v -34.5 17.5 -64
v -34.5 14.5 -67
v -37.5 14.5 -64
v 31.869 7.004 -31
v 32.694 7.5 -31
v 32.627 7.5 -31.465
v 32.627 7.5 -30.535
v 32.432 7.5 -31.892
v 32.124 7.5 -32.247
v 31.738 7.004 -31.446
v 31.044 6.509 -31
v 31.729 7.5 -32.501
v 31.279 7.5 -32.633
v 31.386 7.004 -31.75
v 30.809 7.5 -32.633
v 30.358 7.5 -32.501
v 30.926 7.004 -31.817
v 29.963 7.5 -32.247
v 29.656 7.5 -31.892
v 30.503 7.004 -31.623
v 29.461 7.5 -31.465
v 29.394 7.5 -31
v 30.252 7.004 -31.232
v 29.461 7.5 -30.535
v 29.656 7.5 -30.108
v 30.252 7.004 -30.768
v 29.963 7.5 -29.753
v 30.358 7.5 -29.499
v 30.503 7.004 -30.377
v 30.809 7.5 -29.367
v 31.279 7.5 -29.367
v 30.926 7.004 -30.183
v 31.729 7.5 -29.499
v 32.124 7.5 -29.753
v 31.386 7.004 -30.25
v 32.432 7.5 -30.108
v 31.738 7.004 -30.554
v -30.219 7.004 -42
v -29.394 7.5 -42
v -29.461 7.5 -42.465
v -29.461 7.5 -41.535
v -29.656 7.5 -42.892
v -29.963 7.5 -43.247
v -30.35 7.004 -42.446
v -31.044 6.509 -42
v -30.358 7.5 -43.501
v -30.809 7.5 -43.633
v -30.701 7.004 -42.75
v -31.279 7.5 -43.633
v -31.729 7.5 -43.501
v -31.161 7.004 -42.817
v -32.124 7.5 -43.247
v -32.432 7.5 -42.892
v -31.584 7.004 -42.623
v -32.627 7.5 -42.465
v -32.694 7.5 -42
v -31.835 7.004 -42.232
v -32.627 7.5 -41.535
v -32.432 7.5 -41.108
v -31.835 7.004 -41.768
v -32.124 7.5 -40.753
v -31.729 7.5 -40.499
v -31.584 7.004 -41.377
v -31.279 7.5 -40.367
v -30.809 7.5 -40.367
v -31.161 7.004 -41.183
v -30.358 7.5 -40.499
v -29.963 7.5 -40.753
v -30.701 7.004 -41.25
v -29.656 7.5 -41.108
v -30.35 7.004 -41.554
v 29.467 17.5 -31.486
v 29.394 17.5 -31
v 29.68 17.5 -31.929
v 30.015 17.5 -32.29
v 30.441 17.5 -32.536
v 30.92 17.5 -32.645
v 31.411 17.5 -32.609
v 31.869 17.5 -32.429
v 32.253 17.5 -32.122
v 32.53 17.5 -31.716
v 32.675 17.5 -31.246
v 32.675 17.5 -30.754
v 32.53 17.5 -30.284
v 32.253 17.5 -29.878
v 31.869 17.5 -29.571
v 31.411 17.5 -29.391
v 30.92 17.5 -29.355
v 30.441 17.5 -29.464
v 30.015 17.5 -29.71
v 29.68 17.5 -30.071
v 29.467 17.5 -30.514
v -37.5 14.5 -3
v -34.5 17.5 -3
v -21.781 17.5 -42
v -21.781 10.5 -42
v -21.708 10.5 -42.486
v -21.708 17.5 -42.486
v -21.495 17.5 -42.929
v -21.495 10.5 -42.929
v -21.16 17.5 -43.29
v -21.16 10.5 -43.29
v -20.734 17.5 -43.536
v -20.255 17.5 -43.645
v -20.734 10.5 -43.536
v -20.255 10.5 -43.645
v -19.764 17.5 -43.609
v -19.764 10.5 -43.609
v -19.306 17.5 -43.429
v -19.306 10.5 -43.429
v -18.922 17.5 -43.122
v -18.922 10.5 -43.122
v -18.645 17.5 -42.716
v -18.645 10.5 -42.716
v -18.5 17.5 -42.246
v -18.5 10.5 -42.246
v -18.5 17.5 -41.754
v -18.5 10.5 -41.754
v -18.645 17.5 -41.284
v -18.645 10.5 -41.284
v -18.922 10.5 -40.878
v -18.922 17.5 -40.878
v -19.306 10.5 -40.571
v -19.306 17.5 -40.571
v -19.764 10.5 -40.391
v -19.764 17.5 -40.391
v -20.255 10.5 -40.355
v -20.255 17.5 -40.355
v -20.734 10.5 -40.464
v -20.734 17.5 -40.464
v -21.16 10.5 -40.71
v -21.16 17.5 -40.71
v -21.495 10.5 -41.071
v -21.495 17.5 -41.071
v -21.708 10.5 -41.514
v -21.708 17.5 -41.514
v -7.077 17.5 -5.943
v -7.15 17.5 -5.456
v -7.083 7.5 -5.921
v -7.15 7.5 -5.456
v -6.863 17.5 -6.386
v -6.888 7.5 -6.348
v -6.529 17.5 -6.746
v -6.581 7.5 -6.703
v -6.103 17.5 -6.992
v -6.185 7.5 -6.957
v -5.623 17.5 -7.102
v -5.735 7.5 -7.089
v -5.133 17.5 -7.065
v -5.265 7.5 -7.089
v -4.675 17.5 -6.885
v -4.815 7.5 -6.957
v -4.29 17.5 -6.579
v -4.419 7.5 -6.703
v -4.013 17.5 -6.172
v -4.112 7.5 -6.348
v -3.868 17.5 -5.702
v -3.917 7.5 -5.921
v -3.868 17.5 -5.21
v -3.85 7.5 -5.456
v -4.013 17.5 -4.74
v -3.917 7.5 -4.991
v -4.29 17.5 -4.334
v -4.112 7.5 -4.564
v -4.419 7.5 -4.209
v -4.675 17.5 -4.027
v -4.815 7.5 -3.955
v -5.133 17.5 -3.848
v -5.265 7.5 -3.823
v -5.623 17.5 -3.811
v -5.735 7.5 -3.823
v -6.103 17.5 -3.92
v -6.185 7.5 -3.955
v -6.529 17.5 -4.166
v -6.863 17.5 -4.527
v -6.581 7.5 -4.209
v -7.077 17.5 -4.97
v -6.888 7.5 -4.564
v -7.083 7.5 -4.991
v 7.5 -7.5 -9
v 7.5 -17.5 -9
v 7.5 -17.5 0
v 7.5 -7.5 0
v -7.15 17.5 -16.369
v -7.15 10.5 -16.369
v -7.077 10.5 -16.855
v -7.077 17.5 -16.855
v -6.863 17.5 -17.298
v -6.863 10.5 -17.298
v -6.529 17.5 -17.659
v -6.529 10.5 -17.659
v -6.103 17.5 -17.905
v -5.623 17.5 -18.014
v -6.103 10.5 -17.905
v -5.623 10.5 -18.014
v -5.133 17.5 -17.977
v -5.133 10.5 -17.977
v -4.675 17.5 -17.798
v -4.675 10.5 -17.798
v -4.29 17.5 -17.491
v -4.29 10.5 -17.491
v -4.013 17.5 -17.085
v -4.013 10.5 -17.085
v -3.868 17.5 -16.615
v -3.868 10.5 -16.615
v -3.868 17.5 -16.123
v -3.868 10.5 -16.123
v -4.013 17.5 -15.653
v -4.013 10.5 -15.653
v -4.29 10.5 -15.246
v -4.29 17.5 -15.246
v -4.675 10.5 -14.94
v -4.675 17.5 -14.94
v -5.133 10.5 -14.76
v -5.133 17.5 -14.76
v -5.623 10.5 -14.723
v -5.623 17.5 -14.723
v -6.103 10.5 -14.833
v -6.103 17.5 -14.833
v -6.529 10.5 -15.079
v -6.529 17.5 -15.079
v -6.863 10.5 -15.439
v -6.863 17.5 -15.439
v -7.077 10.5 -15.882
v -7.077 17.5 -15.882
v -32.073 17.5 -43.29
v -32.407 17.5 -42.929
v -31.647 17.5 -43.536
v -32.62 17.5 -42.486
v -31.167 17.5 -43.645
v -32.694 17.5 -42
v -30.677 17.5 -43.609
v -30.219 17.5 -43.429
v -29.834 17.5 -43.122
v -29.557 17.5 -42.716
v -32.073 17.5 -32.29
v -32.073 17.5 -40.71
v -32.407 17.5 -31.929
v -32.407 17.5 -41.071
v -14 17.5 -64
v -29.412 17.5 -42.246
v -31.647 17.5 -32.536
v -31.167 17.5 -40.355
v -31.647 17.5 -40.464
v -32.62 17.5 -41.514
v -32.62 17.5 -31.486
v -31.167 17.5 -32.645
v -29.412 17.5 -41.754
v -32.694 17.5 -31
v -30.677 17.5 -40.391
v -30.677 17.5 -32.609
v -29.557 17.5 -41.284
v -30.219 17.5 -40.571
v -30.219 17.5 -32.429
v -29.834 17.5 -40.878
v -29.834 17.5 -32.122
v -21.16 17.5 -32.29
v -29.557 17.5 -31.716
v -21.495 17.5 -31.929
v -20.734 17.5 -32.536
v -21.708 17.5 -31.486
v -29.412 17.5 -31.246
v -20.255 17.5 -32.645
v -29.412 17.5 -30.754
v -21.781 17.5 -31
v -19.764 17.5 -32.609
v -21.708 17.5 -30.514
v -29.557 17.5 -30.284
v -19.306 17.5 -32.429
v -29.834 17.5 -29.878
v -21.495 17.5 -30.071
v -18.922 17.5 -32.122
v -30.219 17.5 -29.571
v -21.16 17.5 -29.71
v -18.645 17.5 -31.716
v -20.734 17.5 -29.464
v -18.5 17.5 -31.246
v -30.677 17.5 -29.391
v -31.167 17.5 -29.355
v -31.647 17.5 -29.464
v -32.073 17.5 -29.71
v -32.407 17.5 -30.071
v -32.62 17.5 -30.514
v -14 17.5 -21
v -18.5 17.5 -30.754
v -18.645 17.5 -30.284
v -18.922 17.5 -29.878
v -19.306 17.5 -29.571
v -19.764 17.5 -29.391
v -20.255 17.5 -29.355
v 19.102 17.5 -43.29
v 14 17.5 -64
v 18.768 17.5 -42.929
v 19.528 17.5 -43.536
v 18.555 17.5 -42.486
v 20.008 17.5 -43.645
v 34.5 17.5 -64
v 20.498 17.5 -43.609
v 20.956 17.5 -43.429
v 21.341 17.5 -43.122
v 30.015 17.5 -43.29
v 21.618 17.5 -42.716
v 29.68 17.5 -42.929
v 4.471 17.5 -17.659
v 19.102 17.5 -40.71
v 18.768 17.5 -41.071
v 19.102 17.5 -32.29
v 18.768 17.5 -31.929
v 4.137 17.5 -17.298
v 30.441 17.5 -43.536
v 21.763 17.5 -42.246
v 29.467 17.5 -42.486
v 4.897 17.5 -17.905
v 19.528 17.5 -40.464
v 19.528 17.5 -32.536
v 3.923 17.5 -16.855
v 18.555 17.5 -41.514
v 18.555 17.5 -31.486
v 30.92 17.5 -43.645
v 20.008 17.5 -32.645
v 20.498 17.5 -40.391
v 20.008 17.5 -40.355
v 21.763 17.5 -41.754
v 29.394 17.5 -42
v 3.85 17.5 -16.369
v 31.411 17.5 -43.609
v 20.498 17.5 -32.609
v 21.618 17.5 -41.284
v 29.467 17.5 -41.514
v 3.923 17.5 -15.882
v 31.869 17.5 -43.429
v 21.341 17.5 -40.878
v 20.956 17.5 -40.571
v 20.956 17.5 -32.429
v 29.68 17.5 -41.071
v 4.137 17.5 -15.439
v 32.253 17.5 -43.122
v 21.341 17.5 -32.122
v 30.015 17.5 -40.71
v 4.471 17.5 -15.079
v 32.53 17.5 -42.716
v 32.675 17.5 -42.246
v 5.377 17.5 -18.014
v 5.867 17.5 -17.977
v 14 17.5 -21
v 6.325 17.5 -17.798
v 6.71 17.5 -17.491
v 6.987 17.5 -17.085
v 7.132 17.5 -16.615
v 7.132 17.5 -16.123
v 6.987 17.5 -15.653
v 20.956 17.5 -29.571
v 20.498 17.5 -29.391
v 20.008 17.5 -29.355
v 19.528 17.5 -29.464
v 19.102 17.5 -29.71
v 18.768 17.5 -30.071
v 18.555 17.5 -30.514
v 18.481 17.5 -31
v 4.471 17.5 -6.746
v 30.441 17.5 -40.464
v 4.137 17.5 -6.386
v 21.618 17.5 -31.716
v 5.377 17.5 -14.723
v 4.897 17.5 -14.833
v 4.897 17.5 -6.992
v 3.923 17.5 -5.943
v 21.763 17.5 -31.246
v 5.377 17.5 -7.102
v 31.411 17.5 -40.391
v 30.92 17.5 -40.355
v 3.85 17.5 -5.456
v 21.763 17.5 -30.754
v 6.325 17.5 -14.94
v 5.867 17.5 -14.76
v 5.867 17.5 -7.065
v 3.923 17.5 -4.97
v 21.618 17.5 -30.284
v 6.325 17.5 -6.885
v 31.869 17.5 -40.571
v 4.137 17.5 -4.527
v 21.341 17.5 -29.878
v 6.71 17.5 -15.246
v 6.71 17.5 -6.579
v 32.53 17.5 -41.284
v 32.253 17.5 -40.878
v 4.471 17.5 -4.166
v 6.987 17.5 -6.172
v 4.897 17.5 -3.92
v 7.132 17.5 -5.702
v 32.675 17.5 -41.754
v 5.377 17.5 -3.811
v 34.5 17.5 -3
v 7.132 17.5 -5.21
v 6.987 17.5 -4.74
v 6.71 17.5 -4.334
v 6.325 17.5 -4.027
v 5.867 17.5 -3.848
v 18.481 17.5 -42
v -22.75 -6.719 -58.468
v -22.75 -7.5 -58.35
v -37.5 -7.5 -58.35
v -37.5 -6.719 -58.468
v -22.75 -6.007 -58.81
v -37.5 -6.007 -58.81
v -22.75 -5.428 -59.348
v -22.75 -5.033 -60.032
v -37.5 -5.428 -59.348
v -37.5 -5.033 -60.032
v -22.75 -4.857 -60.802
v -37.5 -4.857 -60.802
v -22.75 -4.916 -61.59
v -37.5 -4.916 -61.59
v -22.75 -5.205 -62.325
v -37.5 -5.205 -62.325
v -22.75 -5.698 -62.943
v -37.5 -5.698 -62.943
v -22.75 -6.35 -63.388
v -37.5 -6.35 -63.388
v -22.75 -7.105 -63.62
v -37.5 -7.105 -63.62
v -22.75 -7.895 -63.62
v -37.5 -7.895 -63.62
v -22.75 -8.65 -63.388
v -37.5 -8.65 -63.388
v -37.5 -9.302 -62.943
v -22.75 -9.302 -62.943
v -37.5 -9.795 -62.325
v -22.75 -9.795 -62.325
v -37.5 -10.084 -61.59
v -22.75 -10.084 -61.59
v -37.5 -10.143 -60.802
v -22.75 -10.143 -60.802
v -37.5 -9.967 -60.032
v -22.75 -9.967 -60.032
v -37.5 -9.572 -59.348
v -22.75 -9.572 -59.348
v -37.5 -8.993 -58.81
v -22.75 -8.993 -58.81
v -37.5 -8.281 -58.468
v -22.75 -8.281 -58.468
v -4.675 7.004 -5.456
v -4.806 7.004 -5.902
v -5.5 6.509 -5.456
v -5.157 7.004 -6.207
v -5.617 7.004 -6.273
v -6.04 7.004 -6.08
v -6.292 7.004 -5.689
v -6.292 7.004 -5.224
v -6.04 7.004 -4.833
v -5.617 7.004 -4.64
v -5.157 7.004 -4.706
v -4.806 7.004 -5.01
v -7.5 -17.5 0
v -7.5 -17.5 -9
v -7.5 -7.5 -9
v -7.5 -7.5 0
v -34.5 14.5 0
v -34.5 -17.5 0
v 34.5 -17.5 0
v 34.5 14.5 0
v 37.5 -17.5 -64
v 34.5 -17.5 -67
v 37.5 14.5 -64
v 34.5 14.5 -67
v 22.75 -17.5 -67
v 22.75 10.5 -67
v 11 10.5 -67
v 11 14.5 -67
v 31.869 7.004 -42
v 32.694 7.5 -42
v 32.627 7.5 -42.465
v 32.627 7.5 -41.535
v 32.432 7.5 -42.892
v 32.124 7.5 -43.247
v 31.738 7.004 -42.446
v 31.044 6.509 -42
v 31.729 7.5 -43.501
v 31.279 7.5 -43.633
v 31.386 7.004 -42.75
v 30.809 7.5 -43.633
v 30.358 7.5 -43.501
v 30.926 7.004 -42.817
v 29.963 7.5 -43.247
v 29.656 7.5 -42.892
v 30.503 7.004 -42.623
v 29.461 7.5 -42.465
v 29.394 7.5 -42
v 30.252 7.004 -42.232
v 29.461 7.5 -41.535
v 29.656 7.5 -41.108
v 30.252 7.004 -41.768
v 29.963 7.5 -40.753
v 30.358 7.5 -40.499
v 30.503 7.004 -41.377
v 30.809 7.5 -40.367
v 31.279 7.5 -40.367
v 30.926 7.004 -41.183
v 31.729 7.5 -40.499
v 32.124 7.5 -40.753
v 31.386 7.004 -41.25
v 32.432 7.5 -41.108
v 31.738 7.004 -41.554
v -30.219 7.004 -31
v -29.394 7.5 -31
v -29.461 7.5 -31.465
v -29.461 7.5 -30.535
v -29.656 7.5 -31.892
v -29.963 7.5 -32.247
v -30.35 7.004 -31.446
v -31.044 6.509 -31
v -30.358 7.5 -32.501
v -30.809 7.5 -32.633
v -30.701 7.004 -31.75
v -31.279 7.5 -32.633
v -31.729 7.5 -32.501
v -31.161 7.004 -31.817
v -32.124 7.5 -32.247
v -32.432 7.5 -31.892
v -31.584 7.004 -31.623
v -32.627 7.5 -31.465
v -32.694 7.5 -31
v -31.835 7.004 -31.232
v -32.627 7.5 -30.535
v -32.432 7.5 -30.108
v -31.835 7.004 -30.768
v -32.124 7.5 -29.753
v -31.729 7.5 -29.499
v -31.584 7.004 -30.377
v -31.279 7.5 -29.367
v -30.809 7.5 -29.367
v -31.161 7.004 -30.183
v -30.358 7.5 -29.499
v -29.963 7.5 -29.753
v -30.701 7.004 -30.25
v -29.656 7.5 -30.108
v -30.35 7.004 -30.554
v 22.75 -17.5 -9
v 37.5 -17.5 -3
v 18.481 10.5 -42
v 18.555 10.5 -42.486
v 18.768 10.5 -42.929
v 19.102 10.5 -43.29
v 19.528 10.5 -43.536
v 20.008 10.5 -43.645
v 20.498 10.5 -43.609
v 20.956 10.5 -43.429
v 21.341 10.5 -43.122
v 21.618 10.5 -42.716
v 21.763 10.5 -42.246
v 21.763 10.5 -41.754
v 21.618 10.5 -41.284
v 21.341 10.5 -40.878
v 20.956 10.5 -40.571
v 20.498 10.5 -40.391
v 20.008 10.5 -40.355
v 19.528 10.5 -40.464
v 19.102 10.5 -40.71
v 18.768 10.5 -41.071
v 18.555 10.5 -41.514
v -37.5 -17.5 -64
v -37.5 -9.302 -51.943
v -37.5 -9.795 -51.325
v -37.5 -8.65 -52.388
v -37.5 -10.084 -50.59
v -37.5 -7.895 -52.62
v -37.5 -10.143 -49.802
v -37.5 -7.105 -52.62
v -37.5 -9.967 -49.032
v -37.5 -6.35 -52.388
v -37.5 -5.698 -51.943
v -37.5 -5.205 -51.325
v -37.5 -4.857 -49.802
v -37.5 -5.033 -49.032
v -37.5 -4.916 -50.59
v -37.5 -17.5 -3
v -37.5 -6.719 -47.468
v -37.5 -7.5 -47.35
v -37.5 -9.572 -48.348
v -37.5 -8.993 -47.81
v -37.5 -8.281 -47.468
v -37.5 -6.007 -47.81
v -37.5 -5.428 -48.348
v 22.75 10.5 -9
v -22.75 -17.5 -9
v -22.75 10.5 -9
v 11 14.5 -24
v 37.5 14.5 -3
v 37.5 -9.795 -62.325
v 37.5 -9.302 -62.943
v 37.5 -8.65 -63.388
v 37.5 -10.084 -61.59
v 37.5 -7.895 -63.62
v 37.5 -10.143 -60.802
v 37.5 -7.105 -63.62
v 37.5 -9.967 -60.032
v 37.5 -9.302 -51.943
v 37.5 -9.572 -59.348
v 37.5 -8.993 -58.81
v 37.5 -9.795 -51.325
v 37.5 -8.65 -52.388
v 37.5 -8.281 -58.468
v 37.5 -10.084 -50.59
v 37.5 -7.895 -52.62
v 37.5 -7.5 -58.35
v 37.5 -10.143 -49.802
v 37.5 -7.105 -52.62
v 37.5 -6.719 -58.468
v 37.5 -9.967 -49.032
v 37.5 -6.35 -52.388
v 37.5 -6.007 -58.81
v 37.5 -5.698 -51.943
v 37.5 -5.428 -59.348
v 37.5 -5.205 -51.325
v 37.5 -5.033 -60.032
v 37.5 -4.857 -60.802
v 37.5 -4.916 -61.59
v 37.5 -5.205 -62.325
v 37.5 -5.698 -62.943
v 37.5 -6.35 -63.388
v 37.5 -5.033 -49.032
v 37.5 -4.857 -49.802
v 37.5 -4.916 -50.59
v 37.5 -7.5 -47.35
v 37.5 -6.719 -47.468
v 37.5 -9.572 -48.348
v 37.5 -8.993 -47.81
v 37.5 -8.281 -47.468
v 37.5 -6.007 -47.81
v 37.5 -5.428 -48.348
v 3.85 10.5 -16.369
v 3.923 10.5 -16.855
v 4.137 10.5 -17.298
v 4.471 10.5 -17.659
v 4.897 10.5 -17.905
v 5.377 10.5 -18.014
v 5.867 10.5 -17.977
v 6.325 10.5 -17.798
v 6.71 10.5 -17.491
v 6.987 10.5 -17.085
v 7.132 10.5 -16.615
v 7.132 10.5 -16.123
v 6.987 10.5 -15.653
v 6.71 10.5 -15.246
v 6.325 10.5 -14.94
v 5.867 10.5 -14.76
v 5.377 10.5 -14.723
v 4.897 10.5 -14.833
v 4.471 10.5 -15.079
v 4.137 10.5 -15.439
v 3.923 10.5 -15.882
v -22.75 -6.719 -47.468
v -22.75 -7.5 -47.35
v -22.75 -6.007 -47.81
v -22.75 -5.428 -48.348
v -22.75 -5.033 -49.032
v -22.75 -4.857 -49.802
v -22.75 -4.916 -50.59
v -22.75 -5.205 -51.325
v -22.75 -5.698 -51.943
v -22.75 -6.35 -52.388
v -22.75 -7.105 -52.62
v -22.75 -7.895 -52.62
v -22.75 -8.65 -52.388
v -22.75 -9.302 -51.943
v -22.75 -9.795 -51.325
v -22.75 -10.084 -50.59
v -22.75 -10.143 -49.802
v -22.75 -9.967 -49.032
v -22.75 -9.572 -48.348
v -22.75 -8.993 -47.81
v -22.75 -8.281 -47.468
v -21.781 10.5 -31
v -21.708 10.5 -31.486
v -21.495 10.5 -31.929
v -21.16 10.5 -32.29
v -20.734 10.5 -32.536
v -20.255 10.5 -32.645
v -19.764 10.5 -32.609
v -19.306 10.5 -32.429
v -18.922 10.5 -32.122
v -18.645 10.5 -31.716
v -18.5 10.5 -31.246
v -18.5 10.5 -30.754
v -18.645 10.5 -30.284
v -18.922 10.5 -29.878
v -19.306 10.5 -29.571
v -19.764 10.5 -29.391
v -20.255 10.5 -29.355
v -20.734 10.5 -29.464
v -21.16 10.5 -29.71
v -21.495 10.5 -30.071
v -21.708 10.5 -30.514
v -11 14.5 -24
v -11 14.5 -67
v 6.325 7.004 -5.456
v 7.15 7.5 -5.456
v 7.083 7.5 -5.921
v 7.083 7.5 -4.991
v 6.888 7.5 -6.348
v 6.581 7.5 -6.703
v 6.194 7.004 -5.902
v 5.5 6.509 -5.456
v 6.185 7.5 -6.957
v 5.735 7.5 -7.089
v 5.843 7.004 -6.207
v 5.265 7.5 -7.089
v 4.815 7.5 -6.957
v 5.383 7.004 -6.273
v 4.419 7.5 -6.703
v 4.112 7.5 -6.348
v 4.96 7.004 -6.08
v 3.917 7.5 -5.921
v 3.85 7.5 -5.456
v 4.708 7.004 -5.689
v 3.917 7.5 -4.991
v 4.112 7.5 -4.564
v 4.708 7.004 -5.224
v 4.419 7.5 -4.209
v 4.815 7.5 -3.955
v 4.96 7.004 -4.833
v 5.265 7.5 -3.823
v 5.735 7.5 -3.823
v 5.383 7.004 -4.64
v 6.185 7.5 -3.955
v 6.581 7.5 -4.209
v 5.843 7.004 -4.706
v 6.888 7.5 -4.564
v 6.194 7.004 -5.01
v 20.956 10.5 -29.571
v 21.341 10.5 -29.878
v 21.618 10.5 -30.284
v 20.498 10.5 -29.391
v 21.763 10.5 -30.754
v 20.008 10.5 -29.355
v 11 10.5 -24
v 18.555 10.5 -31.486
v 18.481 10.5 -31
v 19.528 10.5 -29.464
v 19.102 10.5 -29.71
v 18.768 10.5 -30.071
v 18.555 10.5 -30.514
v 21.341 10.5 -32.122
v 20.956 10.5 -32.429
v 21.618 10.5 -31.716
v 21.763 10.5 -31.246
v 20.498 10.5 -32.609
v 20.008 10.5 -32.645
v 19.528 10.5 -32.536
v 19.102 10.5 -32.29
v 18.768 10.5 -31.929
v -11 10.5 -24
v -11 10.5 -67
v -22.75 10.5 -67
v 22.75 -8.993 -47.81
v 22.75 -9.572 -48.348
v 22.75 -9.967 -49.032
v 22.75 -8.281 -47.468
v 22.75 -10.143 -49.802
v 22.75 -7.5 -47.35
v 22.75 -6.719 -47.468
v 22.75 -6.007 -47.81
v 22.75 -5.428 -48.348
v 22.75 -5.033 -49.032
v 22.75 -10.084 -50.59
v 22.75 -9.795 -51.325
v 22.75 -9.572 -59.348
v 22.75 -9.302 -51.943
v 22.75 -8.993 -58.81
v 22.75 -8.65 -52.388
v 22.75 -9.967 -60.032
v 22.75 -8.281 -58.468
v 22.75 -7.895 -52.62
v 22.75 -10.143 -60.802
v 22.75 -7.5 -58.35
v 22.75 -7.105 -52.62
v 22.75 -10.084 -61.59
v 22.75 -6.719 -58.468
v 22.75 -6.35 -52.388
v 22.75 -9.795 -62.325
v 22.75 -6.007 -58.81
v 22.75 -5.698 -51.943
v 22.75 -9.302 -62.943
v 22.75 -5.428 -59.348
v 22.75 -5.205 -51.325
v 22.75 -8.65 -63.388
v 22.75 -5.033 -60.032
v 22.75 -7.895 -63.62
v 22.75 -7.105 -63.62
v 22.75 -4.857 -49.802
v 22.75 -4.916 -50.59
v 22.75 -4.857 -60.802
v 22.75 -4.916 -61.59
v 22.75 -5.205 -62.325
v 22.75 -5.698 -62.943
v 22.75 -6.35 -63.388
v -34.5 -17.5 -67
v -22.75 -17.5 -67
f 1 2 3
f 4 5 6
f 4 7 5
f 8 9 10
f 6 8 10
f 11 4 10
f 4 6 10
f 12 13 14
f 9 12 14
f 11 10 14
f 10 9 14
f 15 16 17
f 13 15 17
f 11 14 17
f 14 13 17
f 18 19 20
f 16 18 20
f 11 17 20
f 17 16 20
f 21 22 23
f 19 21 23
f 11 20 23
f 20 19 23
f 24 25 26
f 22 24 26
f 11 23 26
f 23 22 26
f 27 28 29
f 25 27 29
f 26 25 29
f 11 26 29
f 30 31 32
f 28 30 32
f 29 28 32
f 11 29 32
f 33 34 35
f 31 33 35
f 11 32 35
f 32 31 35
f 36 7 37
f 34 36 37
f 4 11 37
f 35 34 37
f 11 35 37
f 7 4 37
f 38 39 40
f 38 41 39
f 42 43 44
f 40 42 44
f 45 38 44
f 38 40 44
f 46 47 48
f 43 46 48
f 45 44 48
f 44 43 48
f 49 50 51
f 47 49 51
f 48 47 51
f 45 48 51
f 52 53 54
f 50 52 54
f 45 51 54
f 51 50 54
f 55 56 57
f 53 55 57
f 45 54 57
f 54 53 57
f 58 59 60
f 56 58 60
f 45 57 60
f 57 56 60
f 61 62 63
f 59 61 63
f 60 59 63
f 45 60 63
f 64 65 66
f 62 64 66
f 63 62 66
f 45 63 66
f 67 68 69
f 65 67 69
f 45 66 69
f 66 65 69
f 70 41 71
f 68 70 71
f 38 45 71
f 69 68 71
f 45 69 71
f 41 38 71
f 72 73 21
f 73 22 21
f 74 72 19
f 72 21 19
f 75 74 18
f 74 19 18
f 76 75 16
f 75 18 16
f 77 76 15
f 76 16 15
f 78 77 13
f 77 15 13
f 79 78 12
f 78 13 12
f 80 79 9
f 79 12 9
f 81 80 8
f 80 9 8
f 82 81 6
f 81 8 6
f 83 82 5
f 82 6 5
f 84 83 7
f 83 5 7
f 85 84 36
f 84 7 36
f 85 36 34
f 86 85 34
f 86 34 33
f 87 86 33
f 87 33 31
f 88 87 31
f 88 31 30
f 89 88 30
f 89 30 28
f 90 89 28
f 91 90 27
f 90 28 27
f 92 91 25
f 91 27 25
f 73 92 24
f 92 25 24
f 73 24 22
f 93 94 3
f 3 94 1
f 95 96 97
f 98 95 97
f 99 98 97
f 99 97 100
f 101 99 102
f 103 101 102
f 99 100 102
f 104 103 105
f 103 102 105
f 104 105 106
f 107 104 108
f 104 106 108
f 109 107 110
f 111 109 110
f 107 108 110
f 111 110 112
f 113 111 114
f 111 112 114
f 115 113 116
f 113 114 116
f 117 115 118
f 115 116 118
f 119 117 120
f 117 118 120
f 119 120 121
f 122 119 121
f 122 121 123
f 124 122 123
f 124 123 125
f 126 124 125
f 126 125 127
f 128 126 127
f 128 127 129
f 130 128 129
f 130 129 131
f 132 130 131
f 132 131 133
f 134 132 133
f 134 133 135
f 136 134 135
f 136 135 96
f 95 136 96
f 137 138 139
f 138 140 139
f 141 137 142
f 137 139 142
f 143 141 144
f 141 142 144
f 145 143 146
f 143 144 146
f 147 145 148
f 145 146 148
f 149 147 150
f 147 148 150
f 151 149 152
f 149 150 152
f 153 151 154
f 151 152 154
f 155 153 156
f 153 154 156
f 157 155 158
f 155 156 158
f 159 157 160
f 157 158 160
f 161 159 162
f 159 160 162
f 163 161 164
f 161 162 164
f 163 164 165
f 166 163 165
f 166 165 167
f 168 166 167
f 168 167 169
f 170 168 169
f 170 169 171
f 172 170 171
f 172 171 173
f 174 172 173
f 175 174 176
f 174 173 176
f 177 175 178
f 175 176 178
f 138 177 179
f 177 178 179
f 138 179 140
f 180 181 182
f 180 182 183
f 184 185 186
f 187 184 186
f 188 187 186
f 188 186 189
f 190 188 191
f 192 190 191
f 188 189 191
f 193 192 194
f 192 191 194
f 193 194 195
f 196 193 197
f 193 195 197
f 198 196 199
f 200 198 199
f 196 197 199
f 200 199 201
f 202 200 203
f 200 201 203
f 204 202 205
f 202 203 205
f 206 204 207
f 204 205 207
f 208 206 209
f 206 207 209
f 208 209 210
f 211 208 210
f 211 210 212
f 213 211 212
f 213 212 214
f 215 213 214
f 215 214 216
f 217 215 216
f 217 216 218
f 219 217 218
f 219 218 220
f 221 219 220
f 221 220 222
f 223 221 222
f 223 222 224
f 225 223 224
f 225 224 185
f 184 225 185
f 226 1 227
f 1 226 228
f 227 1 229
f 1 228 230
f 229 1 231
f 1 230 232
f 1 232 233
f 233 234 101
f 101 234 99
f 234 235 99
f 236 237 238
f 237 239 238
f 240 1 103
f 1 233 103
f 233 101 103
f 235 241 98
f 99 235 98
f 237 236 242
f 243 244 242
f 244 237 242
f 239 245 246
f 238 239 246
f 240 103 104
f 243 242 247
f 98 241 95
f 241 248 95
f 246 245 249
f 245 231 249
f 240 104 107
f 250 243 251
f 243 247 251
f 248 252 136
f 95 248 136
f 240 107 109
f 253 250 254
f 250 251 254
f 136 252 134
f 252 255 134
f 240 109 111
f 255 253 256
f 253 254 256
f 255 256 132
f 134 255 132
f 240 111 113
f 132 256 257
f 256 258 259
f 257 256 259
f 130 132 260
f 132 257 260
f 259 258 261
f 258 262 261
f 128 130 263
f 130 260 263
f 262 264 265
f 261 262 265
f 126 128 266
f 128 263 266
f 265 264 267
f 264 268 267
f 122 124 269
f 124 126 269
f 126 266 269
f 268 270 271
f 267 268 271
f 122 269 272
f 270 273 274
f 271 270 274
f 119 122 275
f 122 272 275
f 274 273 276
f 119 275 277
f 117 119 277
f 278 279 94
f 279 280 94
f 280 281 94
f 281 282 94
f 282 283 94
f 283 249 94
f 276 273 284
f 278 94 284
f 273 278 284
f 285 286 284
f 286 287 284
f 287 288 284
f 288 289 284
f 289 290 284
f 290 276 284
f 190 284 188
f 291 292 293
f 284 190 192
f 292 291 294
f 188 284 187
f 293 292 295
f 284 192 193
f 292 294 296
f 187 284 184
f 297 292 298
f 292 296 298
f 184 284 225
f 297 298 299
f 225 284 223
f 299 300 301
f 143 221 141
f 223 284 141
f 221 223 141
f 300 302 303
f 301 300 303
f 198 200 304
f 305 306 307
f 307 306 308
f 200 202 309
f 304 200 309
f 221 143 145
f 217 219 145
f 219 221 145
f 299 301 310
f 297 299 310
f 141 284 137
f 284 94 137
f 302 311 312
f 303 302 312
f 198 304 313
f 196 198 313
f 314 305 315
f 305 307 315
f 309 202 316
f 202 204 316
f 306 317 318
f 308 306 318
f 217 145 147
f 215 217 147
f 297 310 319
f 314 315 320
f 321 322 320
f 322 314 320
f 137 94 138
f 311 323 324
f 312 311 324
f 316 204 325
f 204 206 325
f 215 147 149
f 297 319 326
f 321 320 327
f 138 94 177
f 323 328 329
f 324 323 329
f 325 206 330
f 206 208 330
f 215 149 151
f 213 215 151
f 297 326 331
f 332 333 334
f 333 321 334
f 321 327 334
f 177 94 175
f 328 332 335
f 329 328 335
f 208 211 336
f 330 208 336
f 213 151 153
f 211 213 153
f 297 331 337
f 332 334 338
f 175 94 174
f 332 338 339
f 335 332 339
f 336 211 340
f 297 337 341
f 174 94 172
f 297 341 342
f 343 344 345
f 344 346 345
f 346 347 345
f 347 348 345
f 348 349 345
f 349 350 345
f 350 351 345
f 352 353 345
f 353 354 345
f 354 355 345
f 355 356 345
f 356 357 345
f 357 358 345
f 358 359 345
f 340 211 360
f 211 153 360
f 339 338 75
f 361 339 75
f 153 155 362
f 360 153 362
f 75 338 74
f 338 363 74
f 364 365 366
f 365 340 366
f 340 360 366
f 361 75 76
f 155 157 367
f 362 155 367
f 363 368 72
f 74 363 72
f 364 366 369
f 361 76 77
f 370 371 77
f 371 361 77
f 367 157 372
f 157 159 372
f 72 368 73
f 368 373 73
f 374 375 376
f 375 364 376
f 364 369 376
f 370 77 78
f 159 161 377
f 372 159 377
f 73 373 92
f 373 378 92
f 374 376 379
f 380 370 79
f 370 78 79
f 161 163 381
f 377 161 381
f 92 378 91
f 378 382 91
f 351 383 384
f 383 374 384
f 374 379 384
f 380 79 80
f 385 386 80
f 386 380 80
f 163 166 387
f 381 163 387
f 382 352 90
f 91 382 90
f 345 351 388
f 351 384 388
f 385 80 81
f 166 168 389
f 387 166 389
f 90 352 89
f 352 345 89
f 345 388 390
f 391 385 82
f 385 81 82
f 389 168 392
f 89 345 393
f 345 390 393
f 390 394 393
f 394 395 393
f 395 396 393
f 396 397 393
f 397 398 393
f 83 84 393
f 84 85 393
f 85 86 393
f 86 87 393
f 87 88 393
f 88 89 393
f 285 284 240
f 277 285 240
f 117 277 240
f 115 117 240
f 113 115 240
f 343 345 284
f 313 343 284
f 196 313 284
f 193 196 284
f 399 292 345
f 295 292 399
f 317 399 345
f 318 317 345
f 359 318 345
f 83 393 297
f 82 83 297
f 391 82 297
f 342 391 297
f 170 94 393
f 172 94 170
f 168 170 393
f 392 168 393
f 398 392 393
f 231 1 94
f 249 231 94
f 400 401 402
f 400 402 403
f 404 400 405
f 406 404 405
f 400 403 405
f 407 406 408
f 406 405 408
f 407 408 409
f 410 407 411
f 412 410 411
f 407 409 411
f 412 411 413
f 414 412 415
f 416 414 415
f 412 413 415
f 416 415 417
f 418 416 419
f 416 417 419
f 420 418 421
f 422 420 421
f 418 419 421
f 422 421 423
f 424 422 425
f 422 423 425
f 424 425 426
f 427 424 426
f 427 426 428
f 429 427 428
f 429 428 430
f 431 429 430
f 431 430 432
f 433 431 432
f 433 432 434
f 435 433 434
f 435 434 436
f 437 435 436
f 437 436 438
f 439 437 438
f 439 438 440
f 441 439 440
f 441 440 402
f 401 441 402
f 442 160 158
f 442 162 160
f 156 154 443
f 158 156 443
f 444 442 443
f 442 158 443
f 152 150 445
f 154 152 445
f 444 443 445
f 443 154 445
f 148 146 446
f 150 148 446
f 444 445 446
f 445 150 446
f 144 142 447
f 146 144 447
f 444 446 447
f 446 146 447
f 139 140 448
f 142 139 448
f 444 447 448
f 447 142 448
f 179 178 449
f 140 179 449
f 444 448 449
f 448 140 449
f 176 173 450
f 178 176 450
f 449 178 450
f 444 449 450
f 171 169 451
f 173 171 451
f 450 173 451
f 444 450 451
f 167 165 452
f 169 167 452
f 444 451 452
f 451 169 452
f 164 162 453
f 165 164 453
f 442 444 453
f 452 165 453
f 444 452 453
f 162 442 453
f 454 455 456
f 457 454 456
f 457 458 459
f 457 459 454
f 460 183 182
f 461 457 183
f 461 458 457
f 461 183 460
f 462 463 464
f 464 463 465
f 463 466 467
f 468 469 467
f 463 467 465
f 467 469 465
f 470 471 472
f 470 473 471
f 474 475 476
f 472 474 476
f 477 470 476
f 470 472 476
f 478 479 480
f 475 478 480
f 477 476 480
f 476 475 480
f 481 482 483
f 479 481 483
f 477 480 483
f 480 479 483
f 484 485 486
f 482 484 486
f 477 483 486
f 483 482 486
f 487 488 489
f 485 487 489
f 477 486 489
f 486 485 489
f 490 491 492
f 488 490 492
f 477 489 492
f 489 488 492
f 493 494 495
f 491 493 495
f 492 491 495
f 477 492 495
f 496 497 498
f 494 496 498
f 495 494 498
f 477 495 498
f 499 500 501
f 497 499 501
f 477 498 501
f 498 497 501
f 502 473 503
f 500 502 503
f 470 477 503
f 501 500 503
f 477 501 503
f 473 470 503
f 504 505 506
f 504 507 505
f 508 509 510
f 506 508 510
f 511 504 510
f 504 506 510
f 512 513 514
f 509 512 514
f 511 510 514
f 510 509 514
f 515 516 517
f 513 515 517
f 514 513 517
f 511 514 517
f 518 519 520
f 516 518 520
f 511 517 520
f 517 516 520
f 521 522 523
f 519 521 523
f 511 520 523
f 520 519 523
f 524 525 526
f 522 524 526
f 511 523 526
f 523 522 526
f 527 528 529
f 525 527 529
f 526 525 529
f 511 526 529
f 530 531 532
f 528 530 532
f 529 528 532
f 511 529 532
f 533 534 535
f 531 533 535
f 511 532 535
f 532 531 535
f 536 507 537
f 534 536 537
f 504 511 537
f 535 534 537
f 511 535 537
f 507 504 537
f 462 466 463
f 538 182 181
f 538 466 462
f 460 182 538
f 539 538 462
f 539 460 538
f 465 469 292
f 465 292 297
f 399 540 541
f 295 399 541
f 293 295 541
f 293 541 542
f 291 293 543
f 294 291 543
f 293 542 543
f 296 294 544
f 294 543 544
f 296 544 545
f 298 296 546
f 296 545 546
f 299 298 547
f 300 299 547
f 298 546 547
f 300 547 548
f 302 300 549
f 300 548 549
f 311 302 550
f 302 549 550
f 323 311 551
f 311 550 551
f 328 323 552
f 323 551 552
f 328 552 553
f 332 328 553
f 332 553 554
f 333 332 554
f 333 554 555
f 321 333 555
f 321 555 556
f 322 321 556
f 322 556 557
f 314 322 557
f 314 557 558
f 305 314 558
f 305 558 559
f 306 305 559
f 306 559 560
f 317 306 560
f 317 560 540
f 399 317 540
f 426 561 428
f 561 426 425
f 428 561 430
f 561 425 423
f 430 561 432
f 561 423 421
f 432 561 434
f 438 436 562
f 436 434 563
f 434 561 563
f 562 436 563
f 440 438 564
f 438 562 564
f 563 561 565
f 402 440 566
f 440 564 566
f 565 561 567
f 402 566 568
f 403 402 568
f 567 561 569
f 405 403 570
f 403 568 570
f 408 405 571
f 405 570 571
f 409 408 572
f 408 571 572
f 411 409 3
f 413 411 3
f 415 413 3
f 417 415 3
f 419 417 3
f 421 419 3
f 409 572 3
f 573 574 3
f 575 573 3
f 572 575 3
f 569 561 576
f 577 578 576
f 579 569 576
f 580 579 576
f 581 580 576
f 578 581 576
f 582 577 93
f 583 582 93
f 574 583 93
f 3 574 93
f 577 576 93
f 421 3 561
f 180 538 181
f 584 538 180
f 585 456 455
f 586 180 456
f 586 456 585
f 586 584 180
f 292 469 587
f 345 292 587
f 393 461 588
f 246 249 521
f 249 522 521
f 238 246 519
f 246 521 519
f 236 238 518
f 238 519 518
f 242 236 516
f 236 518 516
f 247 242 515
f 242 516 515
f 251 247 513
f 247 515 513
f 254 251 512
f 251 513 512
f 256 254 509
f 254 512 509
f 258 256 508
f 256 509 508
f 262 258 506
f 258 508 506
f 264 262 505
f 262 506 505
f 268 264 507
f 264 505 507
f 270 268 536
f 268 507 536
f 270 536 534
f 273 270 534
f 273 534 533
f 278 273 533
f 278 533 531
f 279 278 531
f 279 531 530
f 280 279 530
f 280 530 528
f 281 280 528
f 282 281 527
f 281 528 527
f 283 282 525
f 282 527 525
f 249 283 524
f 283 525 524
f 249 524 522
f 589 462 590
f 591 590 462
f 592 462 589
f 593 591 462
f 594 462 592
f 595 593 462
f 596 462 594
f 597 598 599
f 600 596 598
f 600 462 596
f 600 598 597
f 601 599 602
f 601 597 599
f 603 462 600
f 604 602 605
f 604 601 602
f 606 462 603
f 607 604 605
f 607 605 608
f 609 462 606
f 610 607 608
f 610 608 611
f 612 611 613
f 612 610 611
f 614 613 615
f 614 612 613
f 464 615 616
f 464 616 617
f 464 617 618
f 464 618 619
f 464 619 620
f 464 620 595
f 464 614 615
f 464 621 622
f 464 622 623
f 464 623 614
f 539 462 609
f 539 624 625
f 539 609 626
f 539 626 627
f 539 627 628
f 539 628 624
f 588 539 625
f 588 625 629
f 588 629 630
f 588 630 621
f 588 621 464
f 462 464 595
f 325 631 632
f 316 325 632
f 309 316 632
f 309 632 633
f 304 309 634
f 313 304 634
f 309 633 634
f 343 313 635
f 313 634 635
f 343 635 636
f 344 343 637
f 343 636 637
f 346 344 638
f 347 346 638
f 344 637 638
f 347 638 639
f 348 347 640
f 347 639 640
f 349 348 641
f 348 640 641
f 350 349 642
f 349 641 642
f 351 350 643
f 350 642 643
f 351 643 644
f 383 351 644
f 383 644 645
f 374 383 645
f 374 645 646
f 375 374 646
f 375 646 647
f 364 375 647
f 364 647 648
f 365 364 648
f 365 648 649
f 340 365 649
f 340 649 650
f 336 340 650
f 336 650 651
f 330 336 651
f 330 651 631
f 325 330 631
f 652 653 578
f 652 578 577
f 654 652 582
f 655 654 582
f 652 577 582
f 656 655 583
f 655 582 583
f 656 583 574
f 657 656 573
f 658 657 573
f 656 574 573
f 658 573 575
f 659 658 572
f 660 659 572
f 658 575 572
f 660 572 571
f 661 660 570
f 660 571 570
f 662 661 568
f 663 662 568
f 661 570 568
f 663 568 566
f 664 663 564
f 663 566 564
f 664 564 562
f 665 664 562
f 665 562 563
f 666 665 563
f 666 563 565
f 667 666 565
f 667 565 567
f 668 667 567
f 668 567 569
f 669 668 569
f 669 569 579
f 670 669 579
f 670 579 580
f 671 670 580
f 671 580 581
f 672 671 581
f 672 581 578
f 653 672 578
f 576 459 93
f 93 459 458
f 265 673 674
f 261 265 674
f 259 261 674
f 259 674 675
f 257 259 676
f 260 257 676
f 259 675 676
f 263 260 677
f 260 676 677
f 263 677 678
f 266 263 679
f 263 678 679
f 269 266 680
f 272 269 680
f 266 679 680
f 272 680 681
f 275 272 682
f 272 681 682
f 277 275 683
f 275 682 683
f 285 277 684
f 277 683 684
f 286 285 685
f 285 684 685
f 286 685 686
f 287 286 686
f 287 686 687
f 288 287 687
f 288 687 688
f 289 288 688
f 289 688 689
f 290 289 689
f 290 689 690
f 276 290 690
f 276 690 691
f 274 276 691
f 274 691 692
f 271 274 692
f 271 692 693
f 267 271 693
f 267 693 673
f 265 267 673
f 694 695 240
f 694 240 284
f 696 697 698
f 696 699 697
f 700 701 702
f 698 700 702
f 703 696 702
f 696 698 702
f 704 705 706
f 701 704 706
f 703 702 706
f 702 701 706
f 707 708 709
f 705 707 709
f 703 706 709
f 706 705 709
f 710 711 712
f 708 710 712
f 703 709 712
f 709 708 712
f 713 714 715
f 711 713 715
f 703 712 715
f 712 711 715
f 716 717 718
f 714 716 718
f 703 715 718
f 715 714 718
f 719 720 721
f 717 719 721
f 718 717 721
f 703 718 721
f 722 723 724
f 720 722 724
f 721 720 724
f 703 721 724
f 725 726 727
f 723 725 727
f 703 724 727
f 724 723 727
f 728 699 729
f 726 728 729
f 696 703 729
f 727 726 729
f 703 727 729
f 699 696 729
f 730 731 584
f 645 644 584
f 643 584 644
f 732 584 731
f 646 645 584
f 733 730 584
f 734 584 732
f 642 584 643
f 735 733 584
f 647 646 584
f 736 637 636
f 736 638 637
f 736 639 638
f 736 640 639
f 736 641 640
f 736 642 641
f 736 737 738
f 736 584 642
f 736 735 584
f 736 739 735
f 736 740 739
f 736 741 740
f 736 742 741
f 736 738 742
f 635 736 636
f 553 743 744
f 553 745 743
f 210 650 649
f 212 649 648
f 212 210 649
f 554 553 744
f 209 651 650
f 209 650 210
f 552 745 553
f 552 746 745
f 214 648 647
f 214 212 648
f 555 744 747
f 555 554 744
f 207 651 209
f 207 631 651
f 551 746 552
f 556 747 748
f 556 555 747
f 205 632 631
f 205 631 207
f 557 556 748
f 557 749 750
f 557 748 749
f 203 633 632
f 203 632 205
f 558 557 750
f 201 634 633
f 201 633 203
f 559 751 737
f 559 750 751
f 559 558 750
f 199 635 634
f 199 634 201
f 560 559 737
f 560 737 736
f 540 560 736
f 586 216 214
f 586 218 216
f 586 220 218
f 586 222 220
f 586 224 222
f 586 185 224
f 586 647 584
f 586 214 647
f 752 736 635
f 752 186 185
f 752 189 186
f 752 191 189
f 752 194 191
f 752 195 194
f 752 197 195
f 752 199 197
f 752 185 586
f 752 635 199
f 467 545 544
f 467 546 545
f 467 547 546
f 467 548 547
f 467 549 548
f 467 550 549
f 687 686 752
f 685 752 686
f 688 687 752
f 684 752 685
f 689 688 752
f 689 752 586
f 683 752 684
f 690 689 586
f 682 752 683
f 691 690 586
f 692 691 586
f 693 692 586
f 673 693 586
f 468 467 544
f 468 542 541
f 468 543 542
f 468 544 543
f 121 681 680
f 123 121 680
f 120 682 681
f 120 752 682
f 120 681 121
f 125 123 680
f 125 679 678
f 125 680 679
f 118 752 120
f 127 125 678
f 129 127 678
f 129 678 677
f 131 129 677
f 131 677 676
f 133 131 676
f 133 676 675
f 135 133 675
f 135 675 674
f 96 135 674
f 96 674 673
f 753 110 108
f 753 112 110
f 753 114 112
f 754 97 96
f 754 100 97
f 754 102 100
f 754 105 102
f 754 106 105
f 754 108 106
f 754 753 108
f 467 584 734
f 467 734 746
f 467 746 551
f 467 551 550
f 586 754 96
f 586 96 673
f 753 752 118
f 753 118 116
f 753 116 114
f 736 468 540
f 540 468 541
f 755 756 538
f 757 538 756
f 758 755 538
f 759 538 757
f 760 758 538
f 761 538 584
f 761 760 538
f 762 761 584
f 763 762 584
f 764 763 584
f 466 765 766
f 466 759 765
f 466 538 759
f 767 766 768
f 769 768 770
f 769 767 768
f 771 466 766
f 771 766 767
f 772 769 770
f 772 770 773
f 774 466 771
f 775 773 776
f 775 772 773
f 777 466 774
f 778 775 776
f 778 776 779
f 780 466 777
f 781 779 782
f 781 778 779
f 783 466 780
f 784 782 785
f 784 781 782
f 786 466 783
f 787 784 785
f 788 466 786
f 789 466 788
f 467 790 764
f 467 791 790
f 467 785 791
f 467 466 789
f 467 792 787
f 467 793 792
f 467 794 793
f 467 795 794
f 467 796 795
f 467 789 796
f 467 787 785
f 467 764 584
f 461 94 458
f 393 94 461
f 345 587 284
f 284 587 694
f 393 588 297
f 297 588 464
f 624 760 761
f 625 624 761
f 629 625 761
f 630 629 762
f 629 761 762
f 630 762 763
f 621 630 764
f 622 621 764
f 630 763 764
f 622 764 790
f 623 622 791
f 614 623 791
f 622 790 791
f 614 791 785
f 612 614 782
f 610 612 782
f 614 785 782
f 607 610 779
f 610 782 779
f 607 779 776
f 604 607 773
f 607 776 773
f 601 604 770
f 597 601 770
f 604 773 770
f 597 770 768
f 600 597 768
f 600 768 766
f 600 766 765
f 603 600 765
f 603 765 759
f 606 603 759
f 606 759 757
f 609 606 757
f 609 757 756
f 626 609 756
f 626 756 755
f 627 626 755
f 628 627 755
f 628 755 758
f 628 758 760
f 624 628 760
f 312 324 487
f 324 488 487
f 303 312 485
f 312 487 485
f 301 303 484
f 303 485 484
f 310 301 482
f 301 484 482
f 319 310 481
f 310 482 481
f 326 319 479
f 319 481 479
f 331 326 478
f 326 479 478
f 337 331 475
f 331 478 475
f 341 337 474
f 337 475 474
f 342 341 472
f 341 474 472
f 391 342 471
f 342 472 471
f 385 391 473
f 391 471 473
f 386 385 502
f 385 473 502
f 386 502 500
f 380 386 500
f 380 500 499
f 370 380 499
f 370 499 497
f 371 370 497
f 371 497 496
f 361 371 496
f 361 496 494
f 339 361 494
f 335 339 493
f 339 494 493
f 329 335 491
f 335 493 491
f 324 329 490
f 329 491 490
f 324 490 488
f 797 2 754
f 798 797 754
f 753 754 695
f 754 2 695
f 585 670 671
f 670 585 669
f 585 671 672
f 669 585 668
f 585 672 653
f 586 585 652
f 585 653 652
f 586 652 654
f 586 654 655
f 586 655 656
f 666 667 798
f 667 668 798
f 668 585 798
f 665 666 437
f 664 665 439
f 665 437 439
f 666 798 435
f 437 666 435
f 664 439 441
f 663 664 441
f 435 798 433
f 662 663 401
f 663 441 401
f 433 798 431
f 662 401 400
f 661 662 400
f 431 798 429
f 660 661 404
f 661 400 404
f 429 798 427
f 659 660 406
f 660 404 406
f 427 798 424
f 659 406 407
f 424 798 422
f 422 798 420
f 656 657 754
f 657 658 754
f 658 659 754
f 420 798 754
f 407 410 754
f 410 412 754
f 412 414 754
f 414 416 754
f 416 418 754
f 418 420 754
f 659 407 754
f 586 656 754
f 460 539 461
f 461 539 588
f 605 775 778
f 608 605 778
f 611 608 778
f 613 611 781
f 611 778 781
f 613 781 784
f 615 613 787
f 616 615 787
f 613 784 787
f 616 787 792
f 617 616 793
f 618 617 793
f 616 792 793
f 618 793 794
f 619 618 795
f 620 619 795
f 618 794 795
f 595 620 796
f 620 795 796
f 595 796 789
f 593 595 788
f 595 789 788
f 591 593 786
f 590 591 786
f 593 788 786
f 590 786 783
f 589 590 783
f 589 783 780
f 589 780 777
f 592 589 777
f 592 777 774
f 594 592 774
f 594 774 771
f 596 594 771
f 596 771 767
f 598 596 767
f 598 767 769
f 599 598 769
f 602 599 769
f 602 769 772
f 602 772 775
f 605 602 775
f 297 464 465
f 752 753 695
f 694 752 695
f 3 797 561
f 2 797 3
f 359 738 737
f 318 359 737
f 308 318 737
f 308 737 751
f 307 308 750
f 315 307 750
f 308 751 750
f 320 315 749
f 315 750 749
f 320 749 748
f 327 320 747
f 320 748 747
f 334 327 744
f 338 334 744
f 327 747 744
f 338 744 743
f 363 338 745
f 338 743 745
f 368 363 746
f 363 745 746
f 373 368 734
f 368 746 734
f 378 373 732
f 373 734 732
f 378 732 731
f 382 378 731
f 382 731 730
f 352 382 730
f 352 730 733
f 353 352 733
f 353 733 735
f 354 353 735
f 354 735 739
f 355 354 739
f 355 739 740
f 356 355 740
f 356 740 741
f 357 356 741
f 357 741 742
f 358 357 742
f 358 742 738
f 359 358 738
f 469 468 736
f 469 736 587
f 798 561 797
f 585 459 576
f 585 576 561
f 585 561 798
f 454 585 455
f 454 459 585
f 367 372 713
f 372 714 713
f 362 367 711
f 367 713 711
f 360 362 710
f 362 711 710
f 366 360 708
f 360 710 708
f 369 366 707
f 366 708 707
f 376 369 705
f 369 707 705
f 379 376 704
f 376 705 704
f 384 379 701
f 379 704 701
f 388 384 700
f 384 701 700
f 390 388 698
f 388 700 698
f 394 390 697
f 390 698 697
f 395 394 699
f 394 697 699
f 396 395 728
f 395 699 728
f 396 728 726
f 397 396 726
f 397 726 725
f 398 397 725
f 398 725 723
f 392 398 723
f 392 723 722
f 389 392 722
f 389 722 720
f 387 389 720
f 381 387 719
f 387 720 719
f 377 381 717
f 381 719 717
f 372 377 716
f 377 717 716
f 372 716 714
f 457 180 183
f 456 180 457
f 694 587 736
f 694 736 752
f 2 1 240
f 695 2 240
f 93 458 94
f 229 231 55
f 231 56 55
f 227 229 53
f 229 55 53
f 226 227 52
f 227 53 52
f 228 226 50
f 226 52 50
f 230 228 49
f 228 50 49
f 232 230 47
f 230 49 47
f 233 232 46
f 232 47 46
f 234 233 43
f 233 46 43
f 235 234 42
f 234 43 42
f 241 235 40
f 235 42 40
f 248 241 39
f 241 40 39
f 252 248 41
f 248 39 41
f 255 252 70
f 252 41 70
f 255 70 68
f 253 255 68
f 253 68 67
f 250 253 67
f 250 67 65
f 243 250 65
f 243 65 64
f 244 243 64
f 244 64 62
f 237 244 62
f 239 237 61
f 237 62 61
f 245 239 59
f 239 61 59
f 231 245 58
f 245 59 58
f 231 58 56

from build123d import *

# Parameters (mm, degrees)
SKETCH1_W                 = 75
SKETCH1_H                 = 35
BOSS_EXTRUDE1_DEPTH       = 67
SKETCH2_W                 = 45.5
SKETCH2_H                 = 28
CUT_EXTRUDE1_DEPTH        = 58
SKETCH4_W                 = 15
SKETCH4_H                 = 10
CUT_EXTRUDE2_DEPTH        = 72.249561402
SKETCH5_W                 = 22
SKETCH5_H                 = 7
CUT_EXTRUDE3_DEPTH        = 43
F_3_0MM_DOWEL_HOLE1_D     = 3.3
F_3_0MM_DOWEL_HOLE1_DEPTH = 10
F_3_0MM_DOWEL_HOLE1_TIP   = 0.991420021
SKETCH8_R                 = 2.65
CUT_EXTRUDE4_DEPTH        = 103.079625783
CHAMFER1_SIZE             = 3


with BuildPart() as part:
    # Sketch1 → Boss-Extrude1 (new body)
    with BuildSketch(Plane.XY):
        Rectangle(SKETCH1_W, SKETCH1_H)
    extrude(amount=-BOSS_EXTRUDE1_DEPTH)

    # Sketch2 → Cut-Extrude1 (cut)
    with BuildSketch(Plane(origin=(0, 0, -67), x_dir=(-1, 0, 0), z_dir=(0, 0, -1))):
        with Locations((0, -3.5)):
            Rectangle(SKETCH2_W, SKETCH2_H)
    extrude(amount=-CUT_EXTRUDE1_DEPTH, mode=Mode.SUBTRACT)

    # Sketch4 → Cut-Extrude2 (cut, through all)
    with BuildSketch(Plane(origin=(0, 0, -9), x_dir=(-1, 0, 0), z_dir=(0, 0, -1))):
        with Locations((0, -12.5)):
            Rectangle(SKETCH4_W, SKETCH4_H)
    extrude(amount=-CUT_EXTRUDE2_DEPTH, mode=Mode.SUBTRACT)

    # Sketch5 → Cut-Extrude3 (cut)
    with BuildSketch(Plane(origin=(0, 0, -67), x_dir=(-1, 0, 0), z_dir=(0, 0, -1))):
        with Locations((0, 14)):
            Rectangle(SKETCH5_W, SKETCH5_H)
    extrude(amount=-CUT_EXTRUDE3_DEPTH, mode=Mode.SUBTRACT)

    # 3.0mm Dowel Hole1
    with Locations(Plane(origin=(0, 17.5, 0), x_dir=(1, 0, 0), z_dir=(0, 1, 0))):
        with Locations((-31.04375, 31), (-31.04375, 42), (-20.13125, 42), (-20.13125, 31), (-5.5, 16.36875), (5.5, 16.36875), (-5.5, 5.45625), (5.5, 5.45625), (31.04375, 42), (20.13125, 42), (31.04375, 31), (20.13125, 31)):
            Hole(F_3_0MM_DOWEL_HOLE1_D / 2, depth=F_3_0MM_DOWEL_HOLE1_DEPTH)
            with Locations((0, 0, -(F_3_0MM_DOWEL_HOLE1_DEPTH + F_3_0MM_DOWEL_HOLE1_TIP / 2))):  # 118° drill point
                Cone(0, F_3_0MM_DOWEL_HOLE1_D / 2, F_3_0MM_DOWEL_HOLE1_TIP, mode=Mode.SUBTRACT)

    # Sketch8 → Cut-Extrude4 (cut, through all)
    with BuildSketch(Plane.ZY.offset(37.5)):
        with Locations((-61, -7.5)):
            Circle(SKETCH8_R)
        with Locations((-50, -7.5)):
            Circle(SKETCH8_R)
    extrude(amount=-CUT_EXTRUDE4_DEPTH, mode=Mode.SUBTRACT)

    # Chamfer1
    chamfer1_edges = [part.edges().sort_by_distance(p)[0] for p in [
        (-37.5, 0, -67),
        (-24.25, 17.5, -67),
        (0, 17.5, -24),
        (11, 17.5, -45.5),
        (37.5, 0, -67),
        (-11, 17.5, -45.5),
        (-37.5, 0, 0),
        (0, 17.5, 0),
        (37.5, 0, 0),
        (-37.5, 17.5, -33.5),
        (37.5, 17.5, -33.5),
        (24.25, 17.5, -67),
    ]]
    chamfer(chamfer1_edges, length=CHAMFER1_SIZE)


solid = part.part
